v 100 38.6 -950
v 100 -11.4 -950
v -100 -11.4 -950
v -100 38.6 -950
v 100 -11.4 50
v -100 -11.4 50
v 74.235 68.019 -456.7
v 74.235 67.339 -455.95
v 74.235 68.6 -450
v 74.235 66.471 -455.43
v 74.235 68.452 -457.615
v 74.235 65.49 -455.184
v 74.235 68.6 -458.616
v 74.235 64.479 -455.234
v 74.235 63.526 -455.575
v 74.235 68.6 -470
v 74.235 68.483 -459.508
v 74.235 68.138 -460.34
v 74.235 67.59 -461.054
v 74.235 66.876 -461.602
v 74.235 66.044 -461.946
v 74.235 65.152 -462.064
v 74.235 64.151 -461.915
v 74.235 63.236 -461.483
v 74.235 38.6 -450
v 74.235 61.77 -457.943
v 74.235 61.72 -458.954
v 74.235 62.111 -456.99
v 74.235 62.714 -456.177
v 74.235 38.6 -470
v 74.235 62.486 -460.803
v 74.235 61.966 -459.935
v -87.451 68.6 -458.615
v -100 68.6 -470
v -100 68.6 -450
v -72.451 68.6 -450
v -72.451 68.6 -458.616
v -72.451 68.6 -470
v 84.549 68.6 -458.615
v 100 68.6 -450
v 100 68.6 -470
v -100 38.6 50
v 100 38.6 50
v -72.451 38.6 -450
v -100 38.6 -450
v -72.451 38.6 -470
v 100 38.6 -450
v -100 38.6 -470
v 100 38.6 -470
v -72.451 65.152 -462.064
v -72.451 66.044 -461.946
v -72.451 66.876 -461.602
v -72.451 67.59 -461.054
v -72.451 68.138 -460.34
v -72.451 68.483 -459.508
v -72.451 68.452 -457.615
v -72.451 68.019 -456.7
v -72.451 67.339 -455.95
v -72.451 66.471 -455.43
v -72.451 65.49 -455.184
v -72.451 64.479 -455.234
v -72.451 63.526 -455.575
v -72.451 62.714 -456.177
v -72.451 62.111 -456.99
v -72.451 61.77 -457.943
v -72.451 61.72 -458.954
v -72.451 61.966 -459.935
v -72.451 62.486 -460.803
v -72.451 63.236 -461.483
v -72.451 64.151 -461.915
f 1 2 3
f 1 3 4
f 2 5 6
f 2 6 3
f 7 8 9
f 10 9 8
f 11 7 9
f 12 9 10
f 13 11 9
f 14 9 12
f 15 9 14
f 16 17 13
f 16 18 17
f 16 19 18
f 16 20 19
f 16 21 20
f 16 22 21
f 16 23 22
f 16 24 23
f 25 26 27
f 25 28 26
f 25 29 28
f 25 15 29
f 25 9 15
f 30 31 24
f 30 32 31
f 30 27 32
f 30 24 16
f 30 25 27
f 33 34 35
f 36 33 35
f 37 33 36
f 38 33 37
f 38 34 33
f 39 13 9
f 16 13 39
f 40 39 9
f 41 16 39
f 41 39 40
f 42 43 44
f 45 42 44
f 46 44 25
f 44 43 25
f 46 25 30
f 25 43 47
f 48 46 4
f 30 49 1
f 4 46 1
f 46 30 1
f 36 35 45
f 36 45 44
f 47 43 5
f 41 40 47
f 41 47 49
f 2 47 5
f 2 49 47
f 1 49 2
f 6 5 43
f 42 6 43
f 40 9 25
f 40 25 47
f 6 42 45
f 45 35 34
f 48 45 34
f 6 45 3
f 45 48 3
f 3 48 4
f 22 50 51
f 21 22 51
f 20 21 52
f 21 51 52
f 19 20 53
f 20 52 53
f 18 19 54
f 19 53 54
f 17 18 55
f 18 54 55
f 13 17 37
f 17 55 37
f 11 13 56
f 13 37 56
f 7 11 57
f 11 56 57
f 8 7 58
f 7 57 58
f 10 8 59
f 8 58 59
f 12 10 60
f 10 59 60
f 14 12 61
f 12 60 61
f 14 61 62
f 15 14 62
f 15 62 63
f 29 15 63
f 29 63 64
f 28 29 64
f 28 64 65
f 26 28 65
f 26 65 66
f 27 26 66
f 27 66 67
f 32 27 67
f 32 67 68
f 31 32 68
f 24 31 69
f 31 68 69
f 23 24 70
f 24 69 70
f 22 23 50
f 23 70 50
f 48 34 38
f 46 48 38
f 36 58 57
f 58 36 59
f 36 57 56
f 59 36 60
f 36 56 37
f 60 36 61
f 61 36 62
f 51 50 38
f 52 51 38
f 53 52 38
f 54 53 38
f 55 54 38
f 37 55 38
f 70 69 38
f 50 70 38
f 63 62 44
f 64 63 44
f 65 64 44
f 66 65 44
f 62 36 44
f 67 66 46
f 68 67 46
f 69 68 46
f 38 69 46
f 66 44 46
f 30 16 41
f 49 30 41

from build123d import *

# Parameters (mm, degrees)
BOSS_EXTRU_2_DEPTH      = 100
BOSS_EXTRU_2_DEPTH_BACK = 100
ESQUISSE3_W             = 1000
ESQUISSE3_H             = 50
ESQUISSE4_W             = 27.549124878
ESQUISSE4_H             = 20
ESQUISSE4_W_2           = 25.7645404
BOSS_EXTRU_4_DEPTH      = 30
BOSS_EXTRU_5_DEPTH      = 157
BOSS_EXTRU_5_DEPTH_BACK = 15
ESQUISSE7_R             = 3.448131388


with BuildPart() as part:
    # Esquisse3 → Boss.-Extru.2 (new, two sides: drawn at the far end of the back side and taken through both)
    with BuildSketch(Plane(origin=(0, 0, 0), x_dir=(0, 0, -1), z_dir=(1, 0, 0)).offset(-BOSS_EXTRU_2_DEPTH_BACK)):
        with Locations((450, 13.600000315)):
            Rectangle(ESQUISSE3_W, ESQUISSE3_H)
    extrude(amount=BOSS_EXTRU_2_DEPTH + BOSS_EXTRU_2_DEPTH_BACK)

    # Esquisse4 → Boss.-Extru.4 (add)
    with BuildSketch(Plane(origin=(0, 38.600000315, 0), x_dir=(1, 0, 0), z_dir=(0, 1, 0))):
        with Locations((-86.225437561, 460)):
            Rectangle(ESQUISSE4_W, ESQUISSE4_H)
        with Locations((87.1177298, 460)):
            Rectangle(ESQUISSE4_W_2, ESQUISSE4_H)
    extrude(amount=BOSS_EXTRU_4_DEPTH)

    # Esquisse7 → Boss.-Extru.5 (add, two sides: drawn at the far end of the back side and taken through both)
    with BuildSketch(Plane(origin=(-72.450875122, 0, 0), x_dir=(0, 0, -1), z_dir=(1, 0, 0)).offset(-BOSS_EXTRU_5_DEPTH_BACK)):
        with Locations((458.615528394, 65.151868928)):
            Circle(ESQUISSE7_R)
    extrude(amount=BOSS_EXTRU_5_DEPTH + BOSS_EXTRU_5_DEPTH_BACK)


solid = part.part
